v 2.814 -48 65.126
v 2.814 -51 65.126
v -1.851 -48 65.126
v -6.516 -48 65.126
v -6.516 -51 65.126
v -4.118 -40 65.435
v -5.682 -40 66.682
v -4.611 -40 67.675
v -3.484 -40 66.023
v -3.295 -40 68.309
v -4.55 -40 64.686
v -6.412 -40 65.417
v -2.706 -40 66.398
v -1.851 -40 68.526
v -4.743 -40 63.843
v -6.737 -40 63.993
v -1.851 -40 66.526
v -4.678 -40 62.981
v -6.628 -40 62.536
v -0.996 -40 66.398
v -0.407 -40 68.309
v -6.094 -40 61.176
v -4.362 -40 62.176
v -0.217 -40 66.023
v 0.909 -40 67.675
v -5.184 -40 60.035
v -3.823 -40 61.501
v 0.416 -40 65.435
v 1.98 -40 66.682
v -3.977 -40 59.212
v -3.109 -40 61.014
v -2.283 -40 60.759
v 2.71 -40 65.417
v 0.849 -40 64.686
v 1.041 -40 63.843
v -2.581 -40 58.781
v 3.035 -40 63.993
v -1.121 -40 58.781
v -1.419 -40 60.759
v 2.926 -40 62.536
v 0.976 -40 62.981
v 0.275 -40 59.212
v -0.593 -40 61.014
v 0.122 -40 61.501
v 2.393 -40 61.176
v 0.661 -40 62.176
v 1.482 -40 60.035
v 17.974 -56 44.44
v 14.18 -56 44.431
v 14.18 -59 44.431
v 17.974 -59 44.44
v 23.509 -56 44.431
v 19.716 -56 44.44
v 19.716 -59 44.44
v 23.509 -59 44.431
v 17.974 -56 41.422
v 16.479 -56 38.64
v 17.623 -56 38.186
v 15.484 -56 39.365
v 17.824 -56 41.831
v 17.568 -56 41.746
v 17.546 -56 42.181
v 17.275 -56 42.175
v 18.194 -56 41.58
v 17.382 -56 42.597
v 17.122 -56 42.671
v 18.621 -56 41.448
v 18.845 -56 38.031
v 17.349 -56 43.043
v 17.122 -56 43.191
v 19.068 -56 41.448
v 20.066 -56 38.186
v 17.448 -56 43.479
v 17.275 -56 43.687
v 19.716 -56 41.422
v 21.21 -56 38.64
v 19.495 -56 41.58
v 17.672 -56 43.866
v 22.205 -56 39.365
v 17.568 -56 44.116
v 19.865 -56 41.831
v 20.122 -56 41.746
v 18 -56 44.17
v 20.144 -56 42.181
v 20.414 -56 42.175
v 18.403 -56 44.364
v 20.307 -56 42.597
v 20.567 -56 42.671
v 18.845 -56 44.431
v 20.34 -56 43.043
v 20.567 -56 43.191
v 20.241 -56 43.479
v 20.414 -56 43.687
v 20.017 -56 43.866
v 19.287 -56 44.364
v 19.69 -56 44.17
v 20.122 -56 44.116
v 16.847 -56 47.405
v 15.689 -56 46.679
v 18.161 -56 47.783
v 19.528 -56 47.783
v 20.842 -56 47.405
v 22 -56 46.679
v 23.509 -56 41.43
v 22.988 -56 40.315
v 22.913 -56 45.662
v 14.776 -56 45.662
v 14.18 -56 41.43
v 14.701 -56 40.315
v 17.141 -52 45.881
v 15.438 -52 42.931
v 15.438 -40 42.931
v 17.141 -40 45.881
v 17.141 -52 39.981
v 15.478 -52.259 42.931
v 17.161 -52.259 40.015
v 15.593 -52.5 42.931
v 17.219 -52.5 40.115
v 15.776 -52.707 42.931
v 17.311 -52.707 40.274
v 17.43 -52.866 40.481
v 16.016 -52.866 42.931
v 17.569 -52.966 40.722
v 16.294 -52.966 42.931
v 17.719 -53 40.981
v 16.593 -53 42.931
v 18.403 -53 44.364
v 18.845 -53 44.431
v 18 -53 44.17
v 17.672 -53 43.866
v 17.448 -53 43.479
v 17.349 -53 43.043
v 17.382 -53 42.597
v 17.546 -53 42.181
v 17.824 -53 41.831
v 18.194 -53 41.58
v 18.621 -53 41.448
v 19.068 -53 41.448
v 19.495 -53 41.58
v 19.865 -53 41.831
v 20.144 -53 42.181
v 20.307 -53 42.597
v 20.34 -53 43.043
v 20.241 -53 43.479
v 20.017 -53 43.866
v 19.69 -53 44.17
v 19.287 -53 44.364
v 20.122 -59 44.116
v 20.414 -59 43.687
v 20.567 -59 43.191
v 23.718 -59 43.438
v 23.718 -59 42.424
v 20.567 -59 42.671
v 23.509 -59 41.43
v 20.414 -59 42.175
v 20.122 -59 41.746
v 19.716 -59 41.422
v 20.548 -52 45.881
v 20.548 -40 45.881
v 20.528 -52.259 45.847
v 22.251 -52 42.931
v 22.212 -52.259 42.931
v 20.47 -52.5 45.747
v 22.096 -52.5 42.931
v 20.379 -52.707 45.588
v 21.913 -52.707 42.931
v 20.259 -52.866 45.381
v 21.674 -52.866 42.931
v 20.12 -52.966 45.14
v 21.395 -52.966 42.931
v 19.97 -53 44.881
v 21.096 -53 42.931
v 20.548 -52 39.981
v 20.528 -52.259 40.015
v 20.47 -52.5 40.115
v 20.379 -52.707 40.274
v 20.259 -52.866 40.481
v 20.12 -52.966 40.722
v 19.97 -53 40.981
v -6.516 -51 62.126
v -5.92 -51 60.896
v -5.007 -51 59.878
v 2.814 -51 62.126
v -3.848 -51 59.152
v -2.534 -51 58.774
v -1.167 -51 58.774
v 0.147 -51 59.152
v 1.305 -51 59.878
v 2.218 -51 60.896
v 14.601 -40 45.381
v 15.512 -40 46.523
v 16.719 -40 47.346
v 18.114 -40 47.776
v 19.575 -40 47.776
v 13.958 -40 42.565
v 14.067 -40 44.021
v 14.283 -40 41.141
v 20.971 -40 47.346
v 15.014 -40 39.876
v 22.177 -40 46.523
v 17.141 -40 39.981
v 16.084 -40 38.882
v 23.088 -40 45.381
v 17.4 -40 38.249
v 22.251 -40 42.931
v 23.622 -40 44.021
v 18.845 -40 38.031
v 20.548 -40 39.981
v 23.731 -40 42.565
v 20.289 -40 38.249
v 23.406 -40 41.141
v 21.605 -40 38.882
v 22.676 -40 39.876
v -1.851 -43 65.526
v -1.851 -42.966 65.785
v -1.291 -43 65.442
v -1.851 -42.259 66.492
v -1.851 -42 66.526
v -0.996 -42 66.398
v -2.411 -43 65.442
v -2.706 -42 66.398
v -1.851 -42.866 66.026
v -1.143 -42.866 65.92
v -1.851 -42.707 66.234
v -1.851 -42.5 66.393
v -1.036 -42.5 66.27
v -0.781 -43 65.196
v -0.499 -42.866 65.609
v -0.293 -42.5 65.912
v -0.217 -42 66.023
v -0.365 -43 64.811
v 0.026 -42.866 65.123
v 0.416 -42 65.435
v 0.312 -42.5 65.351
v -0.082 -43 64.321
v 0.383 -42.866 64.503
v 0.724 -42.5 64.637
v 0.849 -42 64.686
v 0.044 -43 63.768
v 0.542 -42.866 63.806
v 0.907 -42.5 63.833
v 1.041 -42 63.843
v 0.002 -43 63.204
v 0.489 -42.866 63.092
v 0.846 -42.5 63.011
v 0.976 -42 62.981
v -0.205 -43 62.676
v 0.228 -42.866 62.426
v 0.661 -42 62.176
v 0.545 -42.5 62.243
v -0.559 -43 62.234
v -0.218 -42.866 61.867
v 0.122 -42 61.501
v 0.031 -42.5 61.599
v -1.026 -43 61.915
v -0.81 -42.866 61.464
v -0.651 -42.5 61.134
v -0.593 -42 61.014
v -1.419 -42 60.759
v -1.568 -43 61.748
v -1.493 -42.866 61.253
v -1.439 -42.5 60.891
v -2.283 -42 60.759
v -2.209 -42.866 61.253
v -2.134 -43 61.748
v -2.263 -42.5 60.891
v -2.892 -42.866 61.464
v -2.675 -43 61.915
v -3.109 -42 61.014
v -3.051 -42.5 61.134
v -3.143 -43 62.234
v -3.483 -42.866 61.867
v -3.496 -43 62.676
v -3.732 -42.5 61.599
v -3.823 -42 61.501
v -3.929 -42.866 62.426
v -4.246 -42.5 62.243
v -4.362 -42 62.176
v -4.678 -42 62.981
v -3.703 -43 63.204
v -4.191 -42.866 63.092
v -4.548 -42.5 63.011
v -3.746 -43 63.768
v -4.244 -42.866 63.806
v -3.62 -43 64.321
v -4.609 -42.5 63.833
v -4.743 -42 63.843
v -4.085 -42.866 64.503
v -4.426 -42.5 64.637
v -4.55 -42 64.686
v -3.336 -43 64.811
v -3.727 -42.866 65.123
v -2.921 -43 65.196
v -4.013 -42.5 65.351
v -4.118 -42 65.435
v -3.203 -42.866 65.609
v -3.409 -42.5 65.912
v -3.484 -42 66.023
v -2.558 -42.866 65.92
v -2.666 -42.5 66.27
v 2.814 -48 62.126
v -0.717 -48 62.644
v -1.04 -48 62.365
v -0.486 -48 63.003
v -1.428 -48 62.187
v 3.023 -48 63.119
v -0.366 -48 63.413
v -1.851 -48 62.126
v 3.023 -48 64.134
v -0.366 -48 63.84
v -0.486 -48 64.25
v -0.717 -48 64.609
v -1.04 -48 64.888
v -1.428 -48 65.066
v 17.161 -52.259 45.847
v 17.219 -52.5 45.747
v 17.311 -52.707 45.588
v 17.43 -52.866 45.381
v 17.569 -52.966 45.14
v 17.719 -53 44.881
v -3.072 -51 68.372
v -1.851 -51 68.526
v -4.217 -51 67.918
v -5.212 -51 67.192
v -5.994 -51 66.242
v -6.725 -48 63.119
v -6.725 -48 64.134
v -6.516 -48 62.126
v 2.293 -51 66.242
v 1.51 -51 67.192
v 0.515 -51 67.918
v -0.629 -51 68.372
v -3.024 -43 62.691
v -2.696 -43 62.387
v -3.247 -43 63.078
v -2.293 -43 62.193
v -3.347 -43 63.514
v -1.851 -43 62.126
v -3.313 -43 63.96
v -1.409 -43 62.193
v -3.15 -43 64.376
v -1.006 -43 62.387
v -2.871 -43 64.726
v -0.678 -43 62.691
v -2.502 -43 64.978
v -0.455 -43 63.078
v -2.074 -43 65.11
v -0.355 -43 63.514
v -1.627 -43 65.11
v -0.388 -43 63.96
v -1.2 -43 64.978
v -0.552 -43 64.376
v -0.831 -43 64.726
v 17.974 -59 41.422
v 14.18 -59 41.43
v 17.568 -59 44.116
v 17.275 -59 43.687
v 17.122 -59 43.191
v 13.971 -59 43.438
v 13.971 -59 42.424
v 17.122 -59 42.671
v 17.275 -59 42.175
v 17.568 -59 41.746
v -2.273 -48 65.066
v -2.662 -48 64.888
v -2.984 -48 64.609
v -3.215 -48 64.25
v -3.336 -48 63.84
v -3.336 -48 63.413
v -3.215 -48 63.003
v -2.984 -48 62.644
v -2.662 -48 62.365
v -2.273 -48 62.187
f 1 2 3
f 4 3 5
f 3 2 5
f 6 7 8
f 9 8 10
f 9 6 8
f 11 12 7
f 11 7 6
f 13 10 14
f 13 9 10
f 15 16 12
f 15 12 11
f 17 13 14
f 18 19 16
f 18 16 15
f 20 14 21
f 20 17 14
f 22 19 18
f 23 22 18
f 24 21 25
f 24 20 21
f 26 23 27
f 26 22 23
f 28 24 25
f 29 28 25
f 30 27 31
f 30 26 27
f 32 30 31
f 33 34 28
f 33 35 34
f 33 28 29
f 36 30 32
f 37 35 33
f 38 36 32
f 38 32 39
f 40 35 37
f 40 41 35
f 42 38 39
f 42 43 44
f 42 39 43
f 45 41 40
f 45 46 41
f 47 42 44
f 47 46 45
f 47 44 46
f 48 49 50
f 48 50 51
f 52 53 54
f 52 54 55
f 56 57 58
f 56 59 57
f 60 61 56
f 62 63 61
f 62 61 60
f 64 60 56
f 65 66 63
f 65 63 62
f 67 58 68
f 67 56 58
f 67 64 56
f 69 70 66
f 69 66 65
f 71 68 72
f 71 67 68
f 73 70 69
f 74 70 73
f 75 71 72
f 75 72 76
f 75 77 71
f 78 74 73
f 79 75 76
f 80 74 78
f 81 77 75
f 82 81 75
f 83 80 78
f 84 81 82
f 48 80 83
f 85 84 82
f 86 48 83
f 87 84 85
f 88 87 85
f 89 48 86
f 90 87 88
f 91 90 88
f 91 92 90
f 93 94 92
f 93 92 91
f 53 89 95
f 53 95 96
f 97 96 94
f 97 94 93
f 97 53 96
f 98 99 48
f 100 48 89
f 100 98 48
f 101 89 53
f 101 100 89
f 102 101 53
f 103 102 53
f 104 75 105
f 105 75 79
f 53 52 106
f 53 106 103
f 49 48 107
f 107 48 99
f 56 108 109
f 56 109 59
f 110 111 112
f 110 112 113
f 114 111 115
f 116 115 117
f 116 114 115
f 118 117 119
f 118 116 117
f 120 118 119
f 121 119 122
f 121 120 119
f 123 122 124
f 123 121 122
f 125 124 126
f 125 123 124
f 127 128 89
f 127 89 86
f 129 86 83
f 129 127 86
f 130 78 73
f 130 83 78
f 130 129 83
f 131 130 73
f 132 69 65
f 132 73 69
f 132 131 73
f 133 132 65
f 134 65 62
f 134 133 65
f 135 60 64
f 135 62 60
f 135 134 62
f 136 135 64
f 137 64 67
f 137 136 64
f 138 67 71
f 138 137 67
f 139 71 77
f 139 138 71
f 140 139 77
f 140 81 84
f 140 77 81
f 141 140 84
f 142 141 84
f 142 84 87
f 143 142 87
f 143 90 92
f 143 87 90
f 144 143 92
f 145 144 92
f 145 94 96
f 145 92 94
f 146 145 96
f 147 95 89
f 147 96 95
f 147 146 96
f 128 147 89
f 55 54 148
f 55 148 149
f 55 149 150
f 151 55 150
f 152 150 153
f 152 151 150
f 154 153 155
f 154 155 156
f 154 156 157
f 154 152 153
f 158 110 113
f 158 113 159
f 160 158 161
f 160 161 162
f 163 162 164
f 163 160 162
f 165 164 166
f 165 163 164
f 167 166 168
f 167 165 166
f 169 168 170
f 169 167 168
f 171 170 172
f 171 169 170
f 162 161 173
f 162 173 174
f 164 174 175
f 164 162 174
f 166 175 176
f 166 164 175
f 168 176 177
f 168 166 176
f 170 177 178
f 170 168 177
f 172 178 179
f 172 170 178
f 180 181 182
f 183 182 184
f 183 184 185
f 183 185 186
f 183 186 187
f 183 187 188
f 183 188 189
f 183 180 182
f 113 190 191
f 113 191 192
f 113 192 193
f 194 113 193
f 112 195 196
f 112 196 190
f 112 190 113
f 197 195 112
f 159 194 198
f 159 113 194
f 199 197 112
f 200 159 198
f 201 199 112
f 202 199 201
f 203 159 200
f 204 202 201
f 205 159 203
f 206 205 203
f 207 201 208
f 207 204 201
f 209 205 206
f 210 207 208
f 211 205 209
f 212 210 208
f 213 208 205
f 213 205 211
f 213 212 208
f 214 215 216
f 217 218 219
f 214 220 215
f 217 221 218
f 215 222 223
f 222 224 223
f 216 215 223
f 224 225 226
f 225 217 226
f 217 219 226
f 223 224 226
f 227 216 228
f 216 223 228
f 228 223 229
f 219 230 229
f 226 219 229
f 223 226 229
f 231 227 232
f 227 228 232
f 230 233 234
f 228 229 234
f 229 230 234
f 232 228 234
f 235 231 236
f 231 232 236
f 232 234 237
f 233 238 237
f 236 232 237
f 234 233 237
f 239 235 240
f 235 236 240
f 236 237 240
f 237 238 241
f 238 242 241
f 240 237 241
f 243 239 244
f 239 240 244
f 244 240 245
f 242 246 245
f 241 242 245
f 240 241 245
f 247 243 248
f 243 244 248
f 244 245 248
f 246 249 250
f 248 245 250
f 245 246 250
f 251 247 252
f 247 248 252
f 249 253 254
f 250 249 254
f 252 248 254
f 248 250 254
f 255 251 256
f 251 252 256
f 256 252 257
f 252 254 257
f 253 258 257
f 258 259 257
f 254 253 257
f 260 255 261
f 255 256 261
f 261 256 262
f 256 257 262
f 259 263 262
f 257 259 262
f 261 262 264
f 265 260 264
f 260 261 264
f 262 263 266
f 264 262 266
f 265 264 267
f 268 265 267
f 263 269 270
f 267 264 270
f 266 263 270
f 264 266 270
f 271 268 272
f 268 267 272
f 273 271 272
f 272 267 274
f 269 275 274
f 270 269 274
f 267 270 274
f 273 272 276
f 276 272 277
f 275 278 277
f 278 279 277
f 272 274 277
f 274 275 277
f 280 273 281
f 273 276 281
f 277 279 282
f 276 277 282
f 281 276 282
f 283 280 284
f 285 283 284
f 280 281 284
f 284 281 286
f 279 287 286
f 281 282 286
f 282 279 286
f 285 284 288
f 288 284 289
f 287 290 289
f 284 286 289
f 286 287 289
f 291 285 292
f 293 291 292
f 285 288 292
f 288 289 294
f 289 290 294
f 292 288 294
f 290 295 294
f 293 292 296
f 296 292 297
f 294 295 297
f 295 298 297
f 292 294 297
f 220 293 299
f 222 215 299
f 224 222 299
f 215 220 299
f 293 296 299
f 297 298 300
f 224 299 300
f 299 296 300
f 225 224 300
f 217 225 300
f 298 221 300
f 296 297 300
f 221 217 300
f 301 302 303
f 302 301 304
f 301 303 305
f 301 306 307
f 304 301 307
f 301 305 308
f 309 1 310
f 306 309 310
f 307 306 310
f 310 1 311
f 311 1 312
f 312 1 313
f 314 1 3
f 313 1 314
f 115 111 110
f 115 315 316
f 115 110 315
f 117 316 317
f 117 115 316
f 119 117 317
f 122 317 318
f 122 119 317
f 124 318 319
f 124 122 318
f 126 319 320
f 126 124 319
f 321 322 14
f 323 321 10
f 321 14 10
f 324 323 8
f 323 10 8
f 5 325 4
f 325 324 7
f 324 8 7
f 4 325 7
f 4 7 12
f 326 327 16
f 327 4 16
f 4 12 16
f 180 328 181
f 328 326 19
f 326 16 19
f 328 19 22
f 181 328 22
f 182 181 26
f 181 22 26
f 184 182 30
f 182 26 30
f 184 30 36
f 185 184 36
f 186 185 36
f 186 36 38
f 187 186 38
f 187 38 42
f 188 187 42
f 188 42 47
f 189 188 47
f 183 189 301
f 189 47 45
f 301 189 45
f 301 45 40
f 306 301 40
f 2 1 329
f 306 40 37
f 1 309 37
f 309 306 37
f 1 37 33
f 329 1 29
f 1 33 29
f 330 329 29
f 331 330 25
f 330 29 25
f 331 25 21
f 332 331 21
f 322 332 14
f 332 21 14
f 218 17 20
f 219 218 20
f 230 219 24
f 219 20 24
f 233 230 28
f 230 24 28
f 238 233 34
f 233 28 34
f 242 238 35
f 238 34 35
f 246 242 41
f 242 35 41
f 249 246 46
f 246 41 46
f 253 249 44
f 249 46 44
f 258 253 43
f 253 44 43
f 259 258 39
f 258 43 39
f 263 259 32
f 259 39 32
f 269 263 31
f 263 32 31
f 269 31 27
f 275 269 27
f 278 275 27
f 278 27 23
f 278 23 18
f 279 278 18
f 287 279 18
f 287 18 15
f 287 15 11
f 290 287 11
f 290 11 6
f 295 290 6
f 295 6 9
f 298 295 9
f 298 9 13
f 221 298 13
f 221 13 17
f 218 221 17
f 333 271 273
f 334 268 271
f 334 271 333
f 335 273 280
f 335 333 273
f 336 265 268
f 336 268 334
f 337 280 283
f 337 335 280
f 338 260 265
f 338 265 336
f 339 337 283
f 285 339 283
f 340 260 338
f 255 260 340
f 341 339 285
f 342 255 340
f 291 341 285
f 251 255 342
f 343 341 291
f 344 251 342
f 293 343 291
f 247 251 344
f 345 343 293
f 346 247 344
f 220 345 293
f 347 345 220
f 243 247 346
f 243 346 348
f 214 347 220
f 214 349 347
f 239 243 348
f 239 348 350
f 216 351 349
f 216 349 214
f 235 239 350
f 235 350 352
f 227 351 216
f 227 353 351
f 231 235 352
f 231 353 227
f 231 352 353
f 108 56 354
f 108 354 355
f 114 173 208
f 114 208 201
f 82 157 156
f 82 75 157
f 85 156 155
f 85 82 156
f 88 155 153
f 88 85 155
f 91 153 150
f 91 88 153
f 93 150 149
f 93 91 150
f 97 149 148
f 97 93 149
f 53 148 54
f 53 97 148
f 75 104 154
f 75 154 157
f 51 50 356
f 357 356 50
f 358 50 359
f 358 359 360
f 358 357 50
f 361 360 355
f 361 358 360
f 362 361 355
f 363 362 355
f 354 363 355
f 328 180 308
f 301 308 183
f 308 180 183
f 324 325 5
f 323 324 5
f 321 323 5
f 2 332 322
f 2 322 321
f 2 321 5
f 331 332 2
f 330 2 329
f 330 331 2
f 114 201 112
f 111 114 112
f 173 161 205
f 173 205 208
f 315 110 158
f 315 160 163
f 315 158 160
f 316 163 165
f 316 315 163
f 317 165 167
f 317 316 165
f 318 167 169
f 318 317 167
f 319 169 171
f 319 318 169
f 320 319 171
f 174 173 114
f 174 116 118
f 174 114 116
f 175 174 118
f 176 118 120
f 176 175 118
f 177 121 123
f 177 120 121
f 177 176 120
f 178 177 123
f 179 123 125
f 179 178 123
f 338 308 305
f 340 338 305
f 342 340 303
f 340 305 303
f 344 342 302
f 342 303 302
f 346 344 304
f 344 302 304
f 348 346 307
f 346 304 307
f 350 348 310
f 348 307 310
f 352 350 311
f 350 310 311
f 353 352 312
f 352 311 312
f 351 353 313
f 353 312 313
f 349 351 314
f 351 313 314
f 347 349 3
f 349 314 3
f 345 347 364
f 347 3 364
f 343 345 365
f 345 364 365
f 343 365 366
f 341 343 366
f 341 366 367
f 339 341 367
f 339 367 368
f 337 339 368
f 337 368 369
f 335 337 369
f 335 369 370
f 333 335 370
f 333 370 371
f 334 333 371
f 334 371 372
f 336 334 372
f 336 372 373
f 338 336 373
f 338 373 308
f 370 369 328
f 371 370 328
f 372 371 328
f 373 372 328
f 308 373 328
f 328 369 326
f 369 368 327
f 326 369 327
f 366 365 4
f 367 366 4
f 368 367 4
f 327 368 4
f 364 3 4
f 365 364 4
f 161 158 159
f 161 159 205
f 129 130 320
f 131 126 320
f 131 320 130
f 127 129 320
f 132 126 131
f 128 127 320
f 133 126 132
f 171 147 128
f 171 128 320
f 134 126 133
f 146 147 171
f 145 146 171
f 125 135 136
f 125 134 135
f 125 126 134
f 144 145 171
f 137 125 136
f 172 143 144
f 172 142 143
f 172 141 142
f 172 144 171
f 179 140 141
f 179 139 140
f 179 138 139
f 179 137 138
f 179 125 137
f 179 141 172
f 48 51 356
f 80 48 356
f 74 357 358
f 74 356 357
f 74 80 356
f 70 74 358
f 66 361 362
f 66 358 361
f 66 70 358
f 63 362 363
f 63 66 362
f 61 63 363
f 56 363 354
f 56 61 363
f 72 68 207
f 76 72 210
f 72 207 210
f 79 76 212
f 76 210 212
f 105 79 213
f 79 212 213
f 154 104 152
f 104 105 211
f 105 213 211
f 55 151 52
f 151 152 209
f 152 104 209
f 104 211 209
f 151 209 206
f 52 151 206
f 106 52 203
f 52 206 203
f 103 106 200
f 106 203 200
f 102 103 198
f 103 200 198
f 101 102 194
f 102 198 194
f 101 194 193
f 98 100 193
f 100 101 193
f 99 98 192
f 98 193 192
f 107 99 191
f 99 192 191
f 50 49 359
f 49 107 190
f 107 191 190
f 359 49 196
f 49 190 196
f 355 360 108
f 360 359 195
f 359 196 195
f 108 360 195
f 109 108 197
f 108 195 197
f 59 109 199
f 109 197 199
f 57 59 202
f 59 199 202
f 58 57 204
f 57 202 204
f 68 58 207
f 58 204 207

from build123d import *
from build123d.topology import SkipClean

# Parameters (mm, degrees)
EXTRUDE_1_DEPTH          = 3
SKETCH_2_R               = 5.35
EXTRUDE_2_DEPTH          = 23
CUT_EXTRUDE_1_DEPTH      = 3
SKETCH_4_R               = 5
EXTRUDE_3_DEPTH          = 100
EXTRUDE_START            = 3
SKETCH_5_R               = 5
EXTRUDE_4_DEPTH          = 3
SKETCH_6_R               = 5.35
EXTRUDE_5_DEPTH          = 5
SKETCH_7_R               = 5.35
EXTRUDE_6_DEPTH          = 5
SKETCH_8_W               = 75
SKETCH_8_H               = 10.7
EXTRUDE_7_DEPTH          = 3
EXTRUDE_8_DEPTH          = 3
CUT_EXTRUDE_2_DEPTH      = 3
SKETCH_12_R              = 6
EXTRUDE_10_DEPTH         = 13
SKETCH_13_R              = 3
CUT_EXTRUDE_3_DEPTH      = 23
SKETCH_14_R              = 3.125
CUT_EXTRUDE_5_DEPTH      = 100
SKETCH_15_R              = 6
SKETCH_15_R_2            = 5.35
EXTRUDE_11_DEPTH         = 5
SKETCH_16_R              = 6
SKETCH_16_R_2            = 3
EXTRUDE_12_DEPTH         = 5
SKETCH_17_R              = 5.35
SKETCH_17_R_2            = 3
EXTRUDE_13_DEPTH         = 5
SKETCH_18_R              = 5.35
SKETCH_18_R_2            = 3
EXTRUDE_14_DEPTH         = 5
SKETCH_20_R              = 6
SKETCH_20_R_2            = 5.35
EXTRUDE_15_DEPTH         = 5
SKETCH_21_R              = 6
SKETCH_21_R_2            = 5.35
EXTRUDE_16_DEPTH         = 5
SKETCH_22_R              = 5.35
SKETCH_22_R_2            = 3
EXTRUDE_17_DEPTH         = 5
SKETCH_23_R              = 5.35
SKETCH_23_R_2            = 3
EXTRUDE_18_DEPTH         = 5
SKETCH_25_R              = 7.5
EXTRUDE_20_DEPTH         = 3
EXTRUDE_21_DEPTH         = 3
EXTRUDE_23_DEPTH         = 3
SKETCH_30_R              = 7.5
EXTRUDE_24_DEPTH         = 3
FILLET_1_R               = 3
EXTRUDE_29_DEPTH         = 5
EXTRUDE_31_DEPTH         = 2
SKETCH_50_R              = 5.998205811
EXTRUDE_32_DEPTH         = 103
CUT_EXTRUDE_START        = -95
SKETCH_52_R              = 5.998205811
SKETCH_52_R_2            = 4.9
CUT_EXTRUDE_7_DEPTH      = 95
CUT_EXTRUDE_START_2      = -44
SKETCH_53_R              = 4.9
CUT_EXTRUDE_8_DEPTH      = 44
SKETCH_54_R              = 1.5
EXTRUDE_33_DEPTH         = 5
CUT_EXTRUDE_9_DEPTH      = 56
CUT_EXTRUDE_START_3      = -6
SKETCH_56_R              = 1.5
CUT_EXTRUDE_10_DEPTH     = 6
SKETCH_57_R              = 15
EXTRUDE_34_DEPTH         = 3
SKETCH_58_R              = 4.9
EXTRUDE_35_DEPTH         = 51
CUT_EXTRUDE_11_DEPTH     = 5
SKETCH_60_R              = 2.75
CUT_EXTRUDE_12_DEPTH     = 46
SKETCH_61_R              = 1.5
CUT_EXTRUDE_13_DEPTH     = 9
CUT_EXTRUDE_14_DEPTH     = 1.65
SKETCH_63_R              = 1
CUT_EXTRUDE_15_DEPTH     = 1.5
PATTERN_CIRCULAR_1_COUNT = 8
SKETCH_64_R              = 3.175426481
CUT_EXTRUDE_17_DEPTH     = 5
CUT_EXTRUDE_18_DEPTH     = 56
FILLET_2_R               = 1
EXTRUDE_36_DEPTH         = 5
SKETCH_67_R              = 1.5
CUT_EXTRUDE_19_DEPTH     = 5
FILLET_3_R               = 1
SKETCH_69_R              = 4.9
EXTRUDE_37_DEPTH         = 3
CUT_EXTRUDE_20_DEPTH     = 3
CUT_EXTRUDE_21_DEPTH     = 3
SKETCH_71_R              = 2.9
CUT_EXTRUDE_22_DEPTH     = 46
FILLET_4_R               = 1
SKETCH_72_R              = 1.742227019
CUT_EXTRUDE_23_DEPTH     = 3
SKETCH_73_R              = 80.568132645
CUT_EXTRUDE_24_DEPTH     = 40
SKETCH_74_R              = 81.791796687
CUT_EXTRUDE_25_DEPTH     = 40


with BuildPart() as part:
    # 草图1 → 凸台-拉伸1 (new body)
    with BuildSketch(Plane(origin=(0, 0, 0), x_dir=(1, 0, 0), z_dir=(0, 1, 0))):
        Polygon((-18.65535641, 0), (18.84464359, -42.930983399), (56.34464359, 0), align=None)
    extrude(amount=EXTRUDE_1_DEPTH)

    # 草图2 → 凸台-拉伸2 (add)
    with BuildSketch(Plane(origin=(0, 3, 0), x_dir=(1, 0, 0), z_dir=(0, 1, 0))):
        with Locations(Location((56.34464359, 0, 0), (0, 0, 270))):
            Circle(SKETCH_2_R)
        with Locations(Location((-18.65535641, 0, 0), (0, 0, 270))):
            Circle(SKETCH_2_R)
    extrude(amount=-EXTRUDE_2_DEPTH)

    # 草图3 → 切除-拉伸1 (cut)
    with BuildSketch(Plane.XZ):
        Polygon((8.632668758, 17.559374543), (1.15609776, 9), (33.75905687, 9), (36.53318942, 9), (29.056618422, 17.559374543), (18.84464359, 29.25031113), align=None)
    extrude(amount=-CUT_EXTRUDE_1_DEPTH, mode=Mode.SUBTRACT)

    # 草图4 → 凸台-拉伸3 (add)
    with BuildSketch(Plane.XZ):
        with Locations(Location((18.84464359, 42.930983399, 0), (0, 0, 228.862949093))):
            Circle(SKETCH_4_R)
    extrude(amount=EXTRUDE_3_DEPTH)

    # 草图5 → 凸台-拉伸4 (add)
    with BuildSketch(Plane(origin=(0, 0, 0), x_dir=(1, 0, 0), z_dir=(0, 1, 0)).offset(EXTRUDE_START)):
        with Locations(Location((18.84464359, -42.930983399, 0), (0, 0, 131.137050907))):
            Circle(SKETCH_5_R)
    extrude(amount=-EXTRUDE_4_DEPTH)

    # 草图6 → 凸台-拉伸5 (add)
    with SkipClean():  # the faces are left unmerged after this step: merging them gives an invalid solid
        with BuildSketch(Plane.XZ.offset(20)):
            with Locations(Location((56.34464359, 0, 0), (0, 0, 131.137050907))):
                Circle(SKETCH_6_R)
        extrude(amount=EXTRUDE_5_DEPTH)
    add(part.part.scale(1), mode=Mode.REPLACE)  # the faces are merged on a copy

    # 草图7 → 凸台-拉伸6 (add)
    with BuildSketch(Plane.XZ.offset(20)):
        with Locations(Location((-18.65535641, 0, 0), (0, 0, 48.862949093))):
            Circle(SKETCH_7_R)
    extrude(amount=EXTRUDE_6_DEPTH)

    # 草图8 → 凸台-拉伸7 (add)
    with SkipClean():  # the faces are left unmerged after this step: merging them gives an invalid solid
        with BuildSketch(Plane(origin=(0, 3, 0), x_dir=(1, 0, 0), z_dir=(0, 1, 0))):
            with Locations((18.84464359, 0)):
                Rectangle(SKETCH_8_W, SKETCH_8_H)
        extrude(amount=-EXTRUDE_7_DEPTH)

    # 草图9 → 凸台-拉伸8 (add)
    with SkipClean():  # the faces are left unmerged after this step: merging them gives an invalid solid
        with BuildSketch(Plane(origin=(0, 3, 0), x_dir=(1, 0, 0), z_dir=(0, 1, 0))):
            Polygon((61.69464359, 0), (18.84464359, -47.930983399), (-24.00535641, 0), align=None)
        extrude(amount=-EXTRUDE_8_DEPTH)

    # 草图10 → 切除-拉伸2 (cut)
    with SkipClean():  # the faces are left unmerged after this step: merging them gives an invalid solid
        with BuildSketch(Plane.XZ):
            Polygon((18.84464359, 37.930983399), (-13.313716495, 0.298969924), (50.99464359, 0), align=None)
        extrude(amount=-CUT_EXTRUDE_2_DEPTH, mode=Mode.SUBTRACT)

    # 草图12 → 凸台-拉伸10 (add)
    with SkipClean():  # the faces are left unmerged after this step: merging them gives an invalid solid
        with BuildSketch(Plane(origin=(0, 3, 0), x_dir=(1, 0, 0), z_dir=(0, 1, 0))):
            with Locations(Location((-18.65535641, 0, 0), (0, 0, 270))):
                Circle(SKETCH_12_R)
            with Locations(Location((56.34464359, 0, 0), (0, 0, 270))):
                Circle(SKETCH_12_R)
        extrude(amount=-EXTRUDE_10_DEPTH)

    # 草图13 → 切除-拉伸3 (cut)
    with SkipClean():  # the faces are left unmerged after this step: merging them gives an invalid solid
        with BuildSketch(Plane.XZ.offset(25)):
            with Locations(Location((-18.65535641, 0, 0), (0, 0, 270))):
                Circle(SKETCH_13_R)
            with Locations(Location((56.34464359, 0, 0), (0, 0, 270))):
                Circle(SKETCH_13_R)
        extrude(amount=-CUT_EXTRUDE_3_DEPTH, mode=Mode.SUBTRACT)

    # 草图14 → 切除-拉伸5 (cut)
    with SkipClean():  # the faces are left unmerged after this step: merging them gives an invalid solid
        with BuildSketch(Plane.XZ.offset(100)):
            with Locations(Location((18.84464359, 42.930983399, 0), (0, 0, 270))):
                Circle(SKETCH_14_R)
        extrude(amount=-CUT_EXTRUDE_5_DEPTH, mode=Mode.SUBTRACT)

    # 草图15 → 凸台-拉伸11 (add)
    with SkipClean():  # the faces are left unmerged after this step: merging them gives an invalid solid
        with BuildSketch(Plane.XZ.offset(10)):
            with Locations(Location((56.34464359, 0, 0), (0, 0, 90.133194259))):
                Circle(SKETCH_15_R)
            with Locations(Location((56.34464359, 0, 0), (0, 0, 270))):
                Circle(SKETCH_15_R_2, mode=Mode.SUBTRACT)
        extrude(amount=EXTRUDE_11_DEPTH)

    # 草图16 → 凸台-拉伸12 (add)
    with SkipClean():  # the faces are left unmerged after this step: merging them gives an invalid solid
        with BuildSketch(Plane.XZ.offset(10)):
            with Locations(Location((-18.65535641, 0, 0), (0, 0, 89.866805741))):
                Circle(SKETCH_16_R)
            with Locations(Location((-18.65535641, 0, 0), (0, 0, 270))):
                Circle(SKETCH_16_R_2, mode=Mode.SUBTRACT)
        extrude(amount=EXTRUDE_12_DEPTH)

    # 草图17 → 凸台-拉伸13 (add)
    with SkipClean():  # the faces are left unmerged after this step: merging them gives an invalid solid
        with BuildSketch(Plane.XZ.offset(25)):
            with Locations(Location((-18.65535641, 0, 0), (0, 0, 270))):
                Circle(SKETCH_17_R)
            with Locations(Location((-18.65535641, 0, 0), (0, 0, 270))):
                Circle(SKETCH_17_R_2, mode=Mode.SUBTRACT)
        extrude(amount=EXTRUDE_13_DEPTH)

    # 草图18 → 凸台-拉伸14 (add)
    with SkipClean():  # the faces are left unmerged after this step: merging them gives an invalid solid
        with BuildSketch(Plane.XZ.offset(25)):
            with Locations(Location((56.34464359, 0, 0), (0, 0, 270))):
                Circle(SKETCH_18_R)
            with Locations(Location((56.34464359, 0, 0), (0, 0, 270))):
                Circle(SKETCH_18_R_2, mode=Mode.SUBTRACT)
        extrude(amount=EXTRUDE_14_DEPTH)

    # 草图20 → 凸台-拉伸15 (add)
    with SkipClean():  # the faces are left unmerged after this step: merging them gives an invalid solid
        with BuildSketch(Plane.XZ.offset(15)):
            with Locations(Location((-18.65535641, 0, 0), (0, 0, 89.866805741))):
                Circle(SKETCH_20_R)
            with Locations(Location((-18.65535641, 0, 0), (0, 0, 270))):
                Circle(SKETCH_20_R_2, mode=Mode.SUBTRACT)
        extrude(amount=EXTRUDE_15_DEPTH)

    # 草图21 → 凸台-拉伸16 (add)
    with SkipClean():  # the faces are left unmerged after this step: merging them gives an invalid solid
        with BuildSketch(Plane.XZ.offset(15)):
            with Locations(Location((56.34464359, 0, 0), (0, 0, 90.133194259))):
                Circle(SKETCH_21_R)
            with Locations(Location((56.34464359, 0, 0), (0, 0, 270))):
                Circle(SKETCH_21_R_2, mode=Mode.SUBTRACT)
        extrude(amount=EXTRUDE_16_DEPTH)

    # 草图22 → 凸台-拉伸17 (add)
    with SkipClean():  # the faces are left unmerged after this step: merging them gives an invalid solid
        with BuildSketch(Plane.XZ.offset(30)):
            with Locations(Location((-18.65535641, 0, 0), (0, 0, 270))):
                Circle(SKETCH_22_R)
            with Locations(Location((-18.65535641, 0, 0), (0, 0, 270))):
                Circle(SKETCH_22_R_2, mode=Mode.SUBTRACT)
        extrude(amount=EXTRUDE_17_DEPTH)

    # 草图23 → 凸台-拉伸18 (add)
    with SkipClean():  # the faces are left unmerged after this step: merging them gives an invalid solid
        with BuildSketch(Plane.XZ.offset(30)):
            with Locations(Location((56.34464359, 0, 0), (0, 0, 270))):
                Circle(SKETCH_23_R)
            with Locations(Location((56.34464359, 0, 0), (0, 0, 270))):
                Circle(SKETCH_23_R_2, mode=Mode.SUBTRACT)
        extrude(amount=EXTRUDE_18_DEPTH)

    # 草图25 → 凸台-拉伸20 (add)
    with SkipClean():  # the faces are left unmerged after this step: merging them gives an invalid solid
        with BuildSketch(Plane(origin=(0, 3, 0), x_dir=(1, 0, 0), z_dir=(0, 1, 0))):
            with Locations((18.84464359, -42.930983399)):
                Circle(SKETCH_25_R)
        extrude(amount=-EXTRUDE_20_DEPTH)

    # 草图28 → 凸台-拉伸21 (add)
    with SkipClean():  # the faces are left unmerged after this step: merging them gives an invalid solid
        with BuildSketch(Plane(origin=(0, 3, 0), x_dir=(1, 0, 0), z_dir=(0, 1, 0))):
            Polygon((-3.379636645, -23.071435978), (2.093554995, -18.328702995), (68.652557408, -96.216669577), (66.868599364, -97.910067347), (64.321605904, -100.026810209), align=None)
        extrude(amount=-EXTRUDE_21_DEPTH)

    # 草图29 → 凸台-拉伸23 (add)
    with SkipClean():  # the faces are left unmerged after this step: merging them gives an invalid solid
        with BuildSketch(Plane(origin=(0, 3, 0), x_dir=(1, 0, 0), z_dir=(0, 1, 0))):
            Polygon((56.34464359, 0), (53.74105837, -88), (59.74105837, -88), (62.34464359, 0), align=None)
        extrude(amount=-EXTRUDE_23_DEPTH)

    # 草图30 → 凸台-拉伸24 (add)
    with SkipClean():  # the faces are left unmerged after this step: merging them gives an invalid solid
        with BuildSketch(Plane(origin=(0, 3, 0), x_dir=(1, 0, 0), z_dir=(0, 1, 0))):
            with Locations((62.6531538, -93.694621783)):
                Circle(SKETCH_30_R)
        extrude(amount=-EXTRUDE_24_DEPTH)

    # 圆角1
    # the kernel refuses this fillet: 3 mm, written as the material it adds along each edge
    with BuildSketch(Plane(origin=(60.387632696, 0, 86.544977448), x_dir=(-0.6496534253779116, 0, -0.760230509052844), z_dir=(0, 1, 0))) as fillet_1_piece_1:
        with BuildLine():
            CenterArc((1.763131122, -3), FILLET_1_R, 90, 55.663998218)
            ThreePointArc((-0.714100998, -1.307864951), (-0.324488751, -0.671711358), (0, 0))
            Line((0, 0), (1.763131122, 0))
        make_face()
    extrude(amount=3)
    with BuildSketch(Plane(origin=(59.804303017, 0, 85.862359607), x_dir=(0.02957325513951661, 0, -0.9995626156376863), z_dir=(0, 1, 0))) as fillet_1_piece_2:
        with BuildLine():
            CenterArc((FILLET_1_R * 0.38596961824, -FILLET_1_R), FILLET_1_R, 90, 42.210146514)
            Line((-FILLET_1_R * 0.285882149698, -FILLET_1_R * 0.259314370385), (0, 0))
            Line((0, 0), (FILLET_1_R * 0.38596961824, 0))
        make_face()
    extrude(amount=3)

    # 草图31 → 凸台-拉伸29 (add)
    with BuildSketch(Plane.XZ):
        Polygon((-14.723586471, -1.628179316), (-14.723586471, -3.628179316), (53.527409972, -3.628179316), (53.82491501, -1.628179316), align=None)
        Polygon((49.609847968, 80.102545011), (51.130308987, 78.80323816), (22.318773999, 45.087710689), (20.798312981, 46.38701754), align=None)
        Polygon((-15.349607435, 4.086383285), (-13.829146417, 2.787076434), (17.097273349, 38.977461836), (15.576812331, 40.276768687), align=None)
        Polygon((20.325894576, 39.186783249), (51.86894969, 1.971881231), (53.394639731, 3.265043982), (21.851584617, 40.479945999), align=None)
        Polygon((56.093860655, 78.864293565), (58.318881117, 3.659610745), (60.319756269, 3.659610745), (58.092985887, 78.923440075), align=None)
    extrude(amount=EXTRUDE_29_DEPTH)

    # 切除-扫描1: sweep along a path in 草图36
    with BuildLine(Plane.XZ.offset(5)) as sweep_1_path:
        Line((18.84464359, -3.628179316), (18.84464359, -1.628179316))
    # 草图35 → 切除-扫描1 (sweep, cut)
    with BuildSketch(Plane(origin=(0, 0, -3.628179316), x_dir=(-1, 0, 0), z_dir=(0, 0, -1))):
        Polygon((13.876620714, -5), (9.876620714, -2), (-47.565907894, -2), (-51.565907894, -5), align=None)
    sweep(path=sweep_1_path.line, mode=Mode.SUBTRACT)

    # 切除-扫描3: sweep along a path in 草图38
    with BuildLine(Plane.XZ.offset(5)) as sweep_3_path:
        Line((59.19369399, 41.720005215), (57.192818839, 41.720005215))
    # 草图37 → 切除-扫描3 (sweep, cut)
    with BuildSketch(Plane(origin=(60.375181238, 0, 1.786271926), x_dir=(0.029573255139513054, 0, -0.9995626156376864), z_dir=(0.9995626156376866, 0, 0.029573255139513057))):
        Polygon((-2.73149314, -5), (-6.73149314, -1), (-73.170921503, -1), (-77.170921503, -5), align=None)
    sweep(path=sweep_3_path.line, mode=Mode.SUBTRACT)

    # 草图39 → 凸台-拉伸31 (add)
    with BuildSketch(Plane(origin=(58.376056006, 0, 1.727125416), x_dir=(0.02957325513951297, 0, -0.9995626156376864), z_dir=(0.9995626156376866, 0, 0.029573255139512974))):
        Polygon((-3.961044, -3.829621531), (-3.961044, -5), (-2.73149314, -5), (-2.73149314, -4.501704435), (-3.961044, -3.272153575), align=None)
    extrude(amount=EXTRUDE_31_DEPTH)

    # 切除-扫描5: sweep along a path in 草图42
    with BuildLine(Plane.XZ.offset(5)) as sweep_5_path:
        Line((0.095091388, 22.159914171), (1.552120507, 20.786378718))
    # 草图40 → 切除-扫描5 (sweep, cut)
    with BuildSketch(Plane(origin=(-10.889521113, 0, 9.305617977), x_dir=(0.6496534253779145, 0, 0.7602305090528415), z_dir=(-0.7602305090528415, 0, 0.6496534253779145))):
        Polygon((-5.121187346, -5), (-3.121187346, -1), (36.9380259, -1), (38.9380259, -5), align=None)
    sweep(path=sweep_5_path.line, mode=Mode.SUBTRACT)

    # 切除-扫描6: sweep along a path in 草图44
    with BuildLine(Plane.XZ.offset(5)) as sweep_6_path:
        Line((36.035656698, 20.652203895), (37.472857905, 22.049766909))
    # 草图43 → 切除-扫描6 (sweep, cut)
    with BuildSketch(Plane(origin=(31.1568423, 0, 26.408291855), x_dir=(-0.6465813751887421, 0, 0.7628450204720715), z_dir=(-0.7628450204720715, 0, -0.6465813751887421))):
        Polygon((14.734624595, -5), (12.734624595, -1), (-27.825731715, -1), (-29.825731715, -5), align=None)
    sweep(path=sweep_6_path.line, mode=Mode.SUBTRACT)

    # 切除-扫描7: sweep along a path in 草图47
    with BuildLine(Plane.XZ.offset(5)) as sweep_7_path:
        Line((37.03221924, 62.305521799), (35.511758222, 63.60482865))
    # 草图46 → 切除-扫描7 (sweep, cut)
    with BuildSketch(Plane(origin=(-10.889521113, 0, 9.305617977), x_dir=(0.6496534253779142, 0, 0.7602305090528417), z_dir=(-0.7602305090528417, 0, 0.6496534253779142))):
        Polygon((50.821835343, -5), (52.821835343, -1), (88.125606235, -1), (93.125606235, 0), (93.125606235, -5), align=None)
    sweep(path=sweep_7_path.line, mode=Mode.SUBTRACT)

    # 切除-扫描8: sweep along a path in 草图49
    with BuildLine(Plane.XZ.offset(1)) as sweep_8_path:
        Line((58.211278907, 74.925189613), (56.210403756, 74.925189613))
        Line((56.210403756, 74.925189613), (55.379994456, 74.925189613))
    # 草图48 → 切除-扫描8 (sweep, cut)
    with BuildSketch(Plane(origin=(60.375181238, 0, 1.786271926), x_dir=(0.029573255139513054, 0, -0.9995626156376864), z_dir=(0.9995626156376866, 0, 0.029573255139513057))):
        Polygon((-73.170921503, -1), (-77.170921503, 0), (-77.170921503, -5), align=None)
    sweep(path=sweep_8_path.line, mode=Mode.SUBTRACT)

    # 草图50 → 凸台-拉伸32 (add)
    with BuildSketch(Plane(origin=(0, 3, 0), x_dir=(1, 0, 0), z_dir=(0, 1, 0))):
        with Locations(Location((18.84464359, -42.930983399, 0), (0, 0, 270))):
            Circle(SKETCH_50_R)
    extrude(amount=-EXTRUDE_32_DEPTH)

    # 草图52 → 切除-拉伸7 (cut)
    with BuildSketch(Plane.XZ.offset(100).offset(CUT_EXTRUDE_START)):
        with Locations((18.84464359, 42.930983399)):
            Circle(SKETCH_52_R)
        with Locations(Location((18.84464359, 42.930983399, 0), (0, 0, 270))):
            Circle(SKETCH_52_R_2, mode=Mode.SUBTRACT)
    extrude(amount=CUT_EXTRUDE_7_DEPTH, mode=Mode.SUBTRACT)

    # 草图53 → 切除-拉伸8 (cut)
    with BuildSketch(Plane.XZ.offset(100).offset(CUT_EXTRUDE_START_2)):
        with Locations(Location((18.84464359, 42.930983399, 0), (0, 0, 270))):
            Circle(SKETCH_53_R)
    extrude(amount=CUT_EXTRUDE_8_DEPTH, mode=Mode.SUBTRACT)

    # 草图54 → 凸台-拉伸33 (add)
    with BuildSketch(Plane.XZ.offset(56)):
        Polygon((22.020070071, 42.930983399), (20.43235683, 45.680983399), (17.25693035, 45.680983399), (15.669217109, 42.930983399), (17.25693035, 40.180983399), (20.43235683, 40.180983399), align=None)
        with Locations(Location((18.84464359, 42.930983399, 0), (0, 0, 270))):
            Circle(SKETCH_54_R, mode=Mode.SUBTRACT)
    extrude(amount=EXTRUDE_33_DEPTH)

    # 草图55 → 切除-拉伸9 (cut)
    with BuildSketch(Plane(origin=(0, 3, 0), x_dir=(1, 0, 0), z_dir=(0, 1, 0))):
        Polygon((22.077805097, -42.930983399), (20.461224344, -40.130983399), (17.228062836, -40.130983399), (15.611482083, -42.930983399), (17.228062836, -45.730983399), (20.461224344, -45.730983399), align=None)
    extrude(amount=-CUT_EXTRUDE_9_DEPTH, mode=Mode.SUBTRACT)

    # 草图56 → 切除-拉伸10 (cut)
    with BuildSketch(Plane.XZ.offset(56).offset(CUT_EXTRUDE_START_3)):
        with Locations(Location((18.84464359, 42.930983399, 0), (0, 0, 90))):
            Circle(SKETCH_56_R)
    extrude(amount=CUT_EXTRUDE_10_DEPTH, mode=Mode.SUBTRACT)

    # 草图64 → 切除-拉伸17 (cut)
    with BuildSketch(Plane.XZ.offset(61)):
        with Locations((18.84464359, 42.930983399)):
            Circle(SKETCH_64_R)
    extrude(amount=-CUT_EXTRUDE_17_DEPTH, mode=Mode.SUBTRACT)

    # 草图65 → 切除-拉伸18 (cut)
    with BuildSketch(Plane(origin=(0, 3, 0), x_dir=(1, 0, 0), z_dir=(0, 1, 0))):
        Polygon((22.251010178, -42.930983399), (20.547826884, -39.980983399), (17.141460296, -39.980983399), (15.438277002, -42.930983399), (17.141460296, -45.880983399), (20.547826884, -45.880983399), align=None)
    extrude(amount=-CUT_EXTRUDE_18_DEPTH, mode=Mode.SUBTRACT)

    # 圆角2
    # the kernel refuses this fillet: 1 mm, written as the material it adds along each edge
    with BuildSketch(Plane(origin=(19.297826884, -53, 48.046046908), x_dir=(0, 1, 0), z_dir=(0.49999999999999994, 0, -0.8660254037844387))) as fillet_2_piece_1_section:
        with BuildLine():
            CenterArc((FILLET_2_R, -FILLET_2_R), FILLET_2_R, 90, 90)
            Line((0, -FILLET_2_R), (0, 0))
            Line((0, 0), (FILLET_2_R, 0))
        make_face()
    fillet_2_piece_1 = extrude(amount=8.406366588, mode=Mode.PRIVATE)
    fillet_2_piece_1 = split(fillet_2_piece_1, bisect_by=Plane(origin=(21.196381273, -52.783149841, 45.880983399), z_dir=(0, 0, -1)), keep=Keep.TOP, mode=Mode.PRIVATE)
    fillet_2_piece_1 = split(fillet_2_piece_1, bisect_by=Plane(origin=(22.575287373, -52.783149841, 43.492647975), z_dir=(-0.8660254037844382, 0, 0.5000000000000009)), keep=Keep.TOP, mode=Mode.PRIVATE)
    add(fillet_2_piece_1)
    with BuildSketch(Plane(origin=(14.641460296, -53, 45.880983399), x_dir=(0, 1, 0), z_dir=(1, 0, 0))) as fillet_2_piece_2_section:
        with BuildLine():
            CenterArc((FILLET_2_R, -FILLET_2_R), FILLET_2_R, 90, 90)
            Line((0, -FILLET_2_R), (0, 0))
            Line((0, 0), (FILLET_2_R, 0))
        make_face()
    fillet_2_piece_2 = extrude(amount=8.406366588, mode=Mode.PRIVATE)
    fillet_2_piece_2 = split(fillet_2_piece_2, bisect_by=Plane(origin=(20.22354969, -52.783149841, 46.442647975), z_dir=(-0.8660254037844387, 0, -0.49999999999999994)), keep=Keep.TOP, mode=Mode.PRIVATE)
    fillet_2_piece_2 = split(fillet_2_piece_2, bisect_by=Plane(origin=(17.46573749, -52.783149841, 46.442647975), z_dir=(0.8660254037844393, 0, -0.49999999999999906)), keep=Keep.TOP, mode=Mode.PRIVATE)
    add(fillet_2_piece_2)
    with BuildSketch(Plane(origin=(14.188277002, -53, 40.765919889), x_dir=(0, 1, 0), z_dir=(0.49999999999999906, 0, 0.8660254037844393))) as fillet_2_piece_3_section:
        with BuildLine():
            CenterArc((FILLET_2_R, -FILLET_2_R), FILLET_2_R, 90, 90)
            Line((0, -FILLET_2_R), (0, 0))
            Line((0, 0), (FILLET_2_R, 0))
        make_face()
    fillet_2_piece_3 = extrude(amount=8.406366588, mode=Mode.PRIVATE)
    fillet_2_piece_3 = split(fillet_2_piece_3, bisect_by=Plane(origin=(16.492905907, -52.783149841, 45.880983399), z_dir=(0, 0, -1)), keep=Keep.TOP, mode=Mode.PRIVATE)
    fillet_2_piece_3 = split(fillet_2_piece_3, bisect_by=Plane(origin=(15.113999807, -52.783149841, 43.492647975), z_dir=(0.8660254037844386, 0, 0.5000000000000002)), keep=Keep.TOP, mode=Mode.PRIVATE)
    add(fillet_2_piece_3)
    with BuildSketch(Plane(origin=(18.391460296, -53, 37.815919889), x_dir=(0, 1, 0), z_dir=(-0.5000000000000002, 0, 0.8660254037844386))) as fillet_2_piece_4_section:
        with BuildLine():
            CenterArc((FILLET_2_R, -FILLET_2_R), FILLET_2_R, 90, 90)
            Line((0, -FILLET_2_R), (0, 0))
            Line((0, 0), (FILLET_2_R, 0))
        make_face()
    fillet_2_piece_4 = extrude(amount=8.406366588, mode=Mode.PRIVATE)
    fillet_2_piece_4 = split(fillet_2_piece_4, bisect_by=Plane(origin=(15.113999807, -52.783149841, 42.369318822), z_dir=(0.8660254037844393, 0, -0.49999999999999906)), keep=Keep.TOP, mode=Mode.PRIVATE)
    fillet_2_piece_4 = split(fillet_2_piece_4, bisect_by=Plane(origin=(16.492905907, -52.783149841, 39.980983399), z_dir=(0, 0, 1)), keep=Keep.TOP, mode=Mode.PRIVATE)
    add(fillet_2_piece_4)
    with BuildSketch(Plane(origin=(23.047826884, -53, 39.980983399), x_dir=(0, 1, 0), z_dir=(-1, 0, 0))) as fillet_2_piece_5_section:
        with BuildLine():
            CenterArc((FILLET_2_R, -FILLET_2_R), FILLET_2_R, 90, 90)
            Line((0, -FILLET_2_R), (0, 0))
            Line((0, 0), (FILLET_2_R, 0))
        make_face()
    fillet_2_piece_5 = extrude(amount=8.406366588, mode=Mode.PRIVATE)
    fillet_2_piece_5 = split(fillet_2_piece_5, bisect_by=Plane(origin=(17.46573749, -52.783149841, 39.419318822), z_dir=(0.8660254037844386, 0, 0.5000000000000002)), keep=Keep.TOP, mode=Mode.PRIVATE)
    fillet_2_piece_5 = split(fillet_2_piece_5, bisect_by=Plane(origin=(20.22354969, -52.783149841, 39.419318822), z_dir=(-0.8660254037844382, 0, 0.5000000000000009)), keep=Keep.TOP, mode=Mode.PRIVATE)
    add(fillet_2_piece_5)
    with BuildSketch(Plane(origin=(23.501010178, -53, 45.096046908), x_dir=(0, 1, 0), z_dir=(-0.5000000000000009, 0, -0.8660254037844382))) as fillet_2_piece_6_section:
        with BuildLine():
            CenterArc((FILLET_2_R, -FILLET_2_R), FILLET_2_R, 90, 90)
            Line((0, -FILLET_2_R), (0, 0))
            Line((0, 0), (FILLET_2_R, 0))
        make_face()
    fillet_2_piece_6 = extrude(amount=8.406366588, mode=Mode.PRIVATE)
    fillet_2_piece_6 = split(fillet_2_piece_6, bisect_by=Plane(origin=(22.575287373, -52.783149841, 42.369318822), z_dir=(-0.8660254037844387, 0, -0.49999999999999994)), keep=Keep.TOP, mode=Mode.PRIVATE)
    fillet_2_piece_6 = split(fillet_2_piece_6, bisect_by=Plane(origin=(21.196381273, -52.783149841, 39.980983399), z_dir=(0, 0, 1)), keep=Keep.TOP, mode=Mode.PRIVATE)
    add(fillet_2_piece_6)

    # 草图69 → 凸台-拉伸37 (add)
    with BuildSketch(Plane.XZ.offset(56)):
        with Locations(Location((18.84464359, 42.930983399, 0), (0, 0, 270))):
            Circle(SKETCH_69_R)
    extrude(amount=EXTRUDE_37_DEPTH)

    # 草图68 → 切除-拉伸20 (cut)
    with BuildSketch(Plane.XZ.offset(56)):
        Polygon((17.97353008, 41.422170541), (13.94464359, 41.430983399), (15.863729909, 37.533957775), (21.64727463, 37.627802071), (23.74464359, 41.430983399), (19.7157571, 41.422170541), (20.586870609, 42.930983399), (19.7157571, 44.439796256), (23.74464359, 44.430983399), (21.991739507, 48.037279535), (15.697547673, 48.037279535), (13.94464359, 44.430983399), (17.97353008, 44.439796256), (17.102416571, 42.930983399), align=None)
    extrude(amount=CUT_EXTRUDE_20_DEPTH, mode=Mode.SUBTRACT)

    # 草图72 → 切除-拉伸23 (cut)
    with BuildSketch(Plane.XZ.offset(56)):
        with Locations((18.84464359, 42.930983399)):
            Circle(SKETCH_72_R)
    extrude(amount=CUT_EXTRUDE_23_DEPTH, mode=Mode.SUBTRACT)


with BuildPart() as body_2:
    # 草图57 → 凸台-拉伸34 (new body)
    with BuildSketch(Plane(origin=(0, 0, 0), x_dir=(1, 0, 0), z_dir=(0, 1, 0))):
        with Locations(Location((-1.85085497, -63.626481958, 0), (0, 0, 270))):
            Circle(SKETCH_57_R)
    extrude(amount=EXTRUDE_34_DEPTH)

    # 草图58 → 凸台-拉伸35 (add)
    with BuildSketch(Plane.XZ):
        with Locations(Location((-1.85085497, 63.626481958, 0), (0, 0, 90))):
            Circle(SKETCH_58_R)
    extrude(amount=EXTRUDE_35_DEPTH)

    # 草图59 → 切除-拉伸11 (cut)
    with BuildSketch(Plane.XZ.offset(51)):
        Polygon((1.324571511, 63.626481958), (-0.263141729, 66.376481958), (-3.43856821, 66.376481958), (-5.02628145, 63.626481958), (-3.43856821, 60.876481958), (-0.263141729, 60.876481958), align=None)
    extrude(amount=-CUT_EXTRUDE_11_DEPTH, mode=Mode.SUBTRACT)

    # 草图60 → 切除-拉伸12 (cut)
    with BuildSketch(Plane(origin=(0, 3, 0), x_dir=(1, 0, 0), z_dir=(0, 1, 0))):
        with Locations(Location((-1.85085497, -63.626481958, 0), (0, 0, 270))):
            Circle(SKETCH_60_R)
    extrude(amount=-CUT_EXTRUDE_12_DEPTH, mode=Mode.SUBTRACT)

    # 草图61 → 切除-拉伸13 (cut)
    with BuildSketch(Plane.XZ.offset(46)):
        with Locations(Location((-1.85085497, 63.626481958, 0), (0, 0, 270))):
            Circle(SKETCH_61_R)
    extrude(amount=-CUT_EXTRUDE_13_DEPTH, mode=Mode.SUBTRACT)

    # 草图62 → 切除-拉伸14 (cut)
    with BuildSketch(Plane.XZ):
        Polygon((10.516281134, 63.626481958), (9.332713082, 65.676481958), (6.965576978, 65.676481958), (5.782008927, 63.626481958), (6.965576978, 61.576481958), (9.332713082, 61.576481958), align=None)
    cut_extrude_14 = extrude(amount=-CUT_EXTRUDE_14_DEPTH, mode=Mode.SUBTRACT)

    # 草图63 → 切除-拉伸15 (cut)
    with BuildSketch(Plane.XZ.offset(-1.65)):
        with Locations(Location((8.14914503, 63.626481958, 0), (0, 0, 270))):
            Circle(SKETCH_63_R)
    cut_extrude_15 = extrude(amount=-CUT_EXTRUDE_15_DEPTH, mode=Mode.SUBTRACT)

    # 阵列(圆周)1: 切除-拉伸14, 切除-拉伸15 ×8 about axis
    pattern_circular_1_axis = Axis((-1.85085497, 0, 63.626481958), (0, 1, 0))
    add([cut_extrude_14.rotate(pattern_circular_1_axis, i * 360 / PATTERN_CIRCULAR_1_COUNT) for i in range(1, PATTERN_CIRCULAR_1_COUNT)], mode=Mode.SUBTRACT)
    add([cut_extrude_15.rotate(pattern_circular_1_axis, i * 360 / PATTERN_CIRCULAR_1_COUNT) for i in range(1, PATTERN_CIRCULAR_1_COUNT)], mode=Mode.SUBTRACT)

    # 草图66 → 凸台-拉伸36 (add)
    with BuildSketch(Plane.XZ.offset(51)):
        Polygon((1.324571511, 63.626481958), (-0.263141729, 66.376481958), (-3.43856821, 66.376481958), (-5.02628145, 63.626481958), (-3.43856821, 60.876481958), (-0.263141729, 60.876481958), align=None)
    extrude(amount=-EXTRUDE_36_DEPTH)

    # 草图67 → 切除-拉伸19 (cut)
    with BuildSketch(Plane.XZ.offset(51)):
        with Locations(Location((-1.85085497, 63.626481958, 0), (0, 0, 270))):
            Circle(SKETCH_67_R)
    extrude(amount=-CUT_EXTRUDE_19_DEPTH, mode=Mode.SUBTRACT)

    # 圆角3
    fillet_3_edges = [body_2.edges().sort_by_distance(p)[0] for p in [
        (-1.85085497, -43, 60.876481958),
    ]]
    fillet(fillet_3_edges, radius=FILLET_3_R)

    # 草图70 → 切除-拉伸21 (cut)
    with BuildSketch(Plane.XZ.offset(51)):
        Polygon((-2.716880374, 65.126481958), (-0.984829566, 65.126481958), (3.220078331, 65.126481958), (3.220078331, 62.126481958), (-0.984829566, 62.126481958), (-2.716880374, 62.126481958), (-7.47972899, 62.126481958), (-7.47972899, 65.126481958), align=None)
    extrude(amount=-CUT_EXTRUDE_21_DEPTH, mode=Mode.SUBTRACT)

    # 草图71 → 切除-拉伸22 (cut)
    with BuildSketch(Plane(origin=(0, 3, 0), x_dir=(1, 0, 0), z_dir=(0, 1, 0))):
        with Locations(Location((-1.85085497, -63.626481958, 0), (0, 0, 270))):
            Circle(SKETCH_71_R)
    extrude(amount=-CUT_EXTRUDE_22_DEPTH, mode=Mode.SUBTRACT)

    # 圆角4
    fillet_4_edges = [body_2.edges().sort_by_distance(p)[0] for p in [
        (-1.85085497, -43, 60.726481958),
    ]]
    fillet(fillet_4_edges, radius=FILLET_4_R)


with BuildPart() as cut_extrude_24_tool:
    # 草图73 → 切除-拉伸24 (new body)
    with BuildSketch(Plane(origin=(0, 0, 0), x_dir=(1, 0, 0), z_dir=(0, 1, 0))):
        with Locations((18.84464359, -42.930983399)):
            Circle(SKETCH_73_R)
    extrude(amount=-CUT_EXTRUDE_24_DEPTH)


with BuildPart() as part_1:
    add(part.part)

    # 切除-拉伸24: cut by cut_extrude_24_tool
    add(cut_extrude_24_tool.part, mode=Mode.SUBTRACT)


with BuildPart() as body_2_1:
    add(body_2.part)

    # 切除-拉伸24: cut by cut_extrude_24_tool
    add(cut_extrude_24_tool.part, mode=Mode.SUBTRACT)


with BuildPart() as cut_extrude_24_piece_1:
    # of the separate pieces the step leaves, piece 1, a body of its own (cut_extrude_24_pieces)
    add(part_1.part.solids().sort_by_distance((22.251010178, 3, 42.930983399))[0])


with BuildPart() as cut_extrude_24_piece_2:
    # of the separate pieces the step leaves, piece 2, a body of its own (cut_extrude_24_pieces)
    add(part_1.part.solids().sort_by_distance((21.09630964, -53, 42.930983399))[0])


with BuildPart() as cut_extrude_24_piece_1_of_body_2:
    # of the separate pieces the step leaves, piece 1, a body of its own (cut_extrude_24_pieces_of_body_2)
    add(body_2_1.part.solids().sort_by_distance((-1.85085497, 3, 66.526481958))[0])


with BuildPart() as cut_extrude_24_piece_2_of_body_2:
    # of the separate pieces the step leaves, piece 2, a body of its own (cut_extrude_24_pieces_of_body_2)
    add(body_2_1.part.solids().sort_by_distance((-1.85085497, -43, 65.526481958))[0])


with BuildPart() as cut_extrude_25_tool:
    # 草图74 → 切除-拉伸25 (new body)
    with BuildSketch(Plane(origin=(0, 0, 0), x_dir=(1, 0, 0), z_dir=(0, 1, 0))):
        with Locations((18.84464359, -42.930983399)):
            Circle(SKETCH_74_R)
    extrude(amount=CUT_EXTRUDE_25_DEPTH)


with BuildPart() as cut_extrude_24_piece_1_1:
    add(cut_extrude_24_piece_1.part)

    # 切除-拉伸25: cut by cut_extrude_25_tool
    add(cut_extrude_25_tool.part, mode=Mode.SUBTRACT)


with BuildPart() as cut_extrude_24_piece_1_of_body_2_1:
    add(cut_extrude_24_piece_1_of_body_2.part)

    # 切除-拉伸25: cut by cut_extrude_25_tool
    add(cut_extrude_25_tool.part, mode=Mode.SUBTRACT)


solid = Compound([cut_extrude_24_piece_2.part, cut_extrude_24_piece_2_of_body_2.part])
